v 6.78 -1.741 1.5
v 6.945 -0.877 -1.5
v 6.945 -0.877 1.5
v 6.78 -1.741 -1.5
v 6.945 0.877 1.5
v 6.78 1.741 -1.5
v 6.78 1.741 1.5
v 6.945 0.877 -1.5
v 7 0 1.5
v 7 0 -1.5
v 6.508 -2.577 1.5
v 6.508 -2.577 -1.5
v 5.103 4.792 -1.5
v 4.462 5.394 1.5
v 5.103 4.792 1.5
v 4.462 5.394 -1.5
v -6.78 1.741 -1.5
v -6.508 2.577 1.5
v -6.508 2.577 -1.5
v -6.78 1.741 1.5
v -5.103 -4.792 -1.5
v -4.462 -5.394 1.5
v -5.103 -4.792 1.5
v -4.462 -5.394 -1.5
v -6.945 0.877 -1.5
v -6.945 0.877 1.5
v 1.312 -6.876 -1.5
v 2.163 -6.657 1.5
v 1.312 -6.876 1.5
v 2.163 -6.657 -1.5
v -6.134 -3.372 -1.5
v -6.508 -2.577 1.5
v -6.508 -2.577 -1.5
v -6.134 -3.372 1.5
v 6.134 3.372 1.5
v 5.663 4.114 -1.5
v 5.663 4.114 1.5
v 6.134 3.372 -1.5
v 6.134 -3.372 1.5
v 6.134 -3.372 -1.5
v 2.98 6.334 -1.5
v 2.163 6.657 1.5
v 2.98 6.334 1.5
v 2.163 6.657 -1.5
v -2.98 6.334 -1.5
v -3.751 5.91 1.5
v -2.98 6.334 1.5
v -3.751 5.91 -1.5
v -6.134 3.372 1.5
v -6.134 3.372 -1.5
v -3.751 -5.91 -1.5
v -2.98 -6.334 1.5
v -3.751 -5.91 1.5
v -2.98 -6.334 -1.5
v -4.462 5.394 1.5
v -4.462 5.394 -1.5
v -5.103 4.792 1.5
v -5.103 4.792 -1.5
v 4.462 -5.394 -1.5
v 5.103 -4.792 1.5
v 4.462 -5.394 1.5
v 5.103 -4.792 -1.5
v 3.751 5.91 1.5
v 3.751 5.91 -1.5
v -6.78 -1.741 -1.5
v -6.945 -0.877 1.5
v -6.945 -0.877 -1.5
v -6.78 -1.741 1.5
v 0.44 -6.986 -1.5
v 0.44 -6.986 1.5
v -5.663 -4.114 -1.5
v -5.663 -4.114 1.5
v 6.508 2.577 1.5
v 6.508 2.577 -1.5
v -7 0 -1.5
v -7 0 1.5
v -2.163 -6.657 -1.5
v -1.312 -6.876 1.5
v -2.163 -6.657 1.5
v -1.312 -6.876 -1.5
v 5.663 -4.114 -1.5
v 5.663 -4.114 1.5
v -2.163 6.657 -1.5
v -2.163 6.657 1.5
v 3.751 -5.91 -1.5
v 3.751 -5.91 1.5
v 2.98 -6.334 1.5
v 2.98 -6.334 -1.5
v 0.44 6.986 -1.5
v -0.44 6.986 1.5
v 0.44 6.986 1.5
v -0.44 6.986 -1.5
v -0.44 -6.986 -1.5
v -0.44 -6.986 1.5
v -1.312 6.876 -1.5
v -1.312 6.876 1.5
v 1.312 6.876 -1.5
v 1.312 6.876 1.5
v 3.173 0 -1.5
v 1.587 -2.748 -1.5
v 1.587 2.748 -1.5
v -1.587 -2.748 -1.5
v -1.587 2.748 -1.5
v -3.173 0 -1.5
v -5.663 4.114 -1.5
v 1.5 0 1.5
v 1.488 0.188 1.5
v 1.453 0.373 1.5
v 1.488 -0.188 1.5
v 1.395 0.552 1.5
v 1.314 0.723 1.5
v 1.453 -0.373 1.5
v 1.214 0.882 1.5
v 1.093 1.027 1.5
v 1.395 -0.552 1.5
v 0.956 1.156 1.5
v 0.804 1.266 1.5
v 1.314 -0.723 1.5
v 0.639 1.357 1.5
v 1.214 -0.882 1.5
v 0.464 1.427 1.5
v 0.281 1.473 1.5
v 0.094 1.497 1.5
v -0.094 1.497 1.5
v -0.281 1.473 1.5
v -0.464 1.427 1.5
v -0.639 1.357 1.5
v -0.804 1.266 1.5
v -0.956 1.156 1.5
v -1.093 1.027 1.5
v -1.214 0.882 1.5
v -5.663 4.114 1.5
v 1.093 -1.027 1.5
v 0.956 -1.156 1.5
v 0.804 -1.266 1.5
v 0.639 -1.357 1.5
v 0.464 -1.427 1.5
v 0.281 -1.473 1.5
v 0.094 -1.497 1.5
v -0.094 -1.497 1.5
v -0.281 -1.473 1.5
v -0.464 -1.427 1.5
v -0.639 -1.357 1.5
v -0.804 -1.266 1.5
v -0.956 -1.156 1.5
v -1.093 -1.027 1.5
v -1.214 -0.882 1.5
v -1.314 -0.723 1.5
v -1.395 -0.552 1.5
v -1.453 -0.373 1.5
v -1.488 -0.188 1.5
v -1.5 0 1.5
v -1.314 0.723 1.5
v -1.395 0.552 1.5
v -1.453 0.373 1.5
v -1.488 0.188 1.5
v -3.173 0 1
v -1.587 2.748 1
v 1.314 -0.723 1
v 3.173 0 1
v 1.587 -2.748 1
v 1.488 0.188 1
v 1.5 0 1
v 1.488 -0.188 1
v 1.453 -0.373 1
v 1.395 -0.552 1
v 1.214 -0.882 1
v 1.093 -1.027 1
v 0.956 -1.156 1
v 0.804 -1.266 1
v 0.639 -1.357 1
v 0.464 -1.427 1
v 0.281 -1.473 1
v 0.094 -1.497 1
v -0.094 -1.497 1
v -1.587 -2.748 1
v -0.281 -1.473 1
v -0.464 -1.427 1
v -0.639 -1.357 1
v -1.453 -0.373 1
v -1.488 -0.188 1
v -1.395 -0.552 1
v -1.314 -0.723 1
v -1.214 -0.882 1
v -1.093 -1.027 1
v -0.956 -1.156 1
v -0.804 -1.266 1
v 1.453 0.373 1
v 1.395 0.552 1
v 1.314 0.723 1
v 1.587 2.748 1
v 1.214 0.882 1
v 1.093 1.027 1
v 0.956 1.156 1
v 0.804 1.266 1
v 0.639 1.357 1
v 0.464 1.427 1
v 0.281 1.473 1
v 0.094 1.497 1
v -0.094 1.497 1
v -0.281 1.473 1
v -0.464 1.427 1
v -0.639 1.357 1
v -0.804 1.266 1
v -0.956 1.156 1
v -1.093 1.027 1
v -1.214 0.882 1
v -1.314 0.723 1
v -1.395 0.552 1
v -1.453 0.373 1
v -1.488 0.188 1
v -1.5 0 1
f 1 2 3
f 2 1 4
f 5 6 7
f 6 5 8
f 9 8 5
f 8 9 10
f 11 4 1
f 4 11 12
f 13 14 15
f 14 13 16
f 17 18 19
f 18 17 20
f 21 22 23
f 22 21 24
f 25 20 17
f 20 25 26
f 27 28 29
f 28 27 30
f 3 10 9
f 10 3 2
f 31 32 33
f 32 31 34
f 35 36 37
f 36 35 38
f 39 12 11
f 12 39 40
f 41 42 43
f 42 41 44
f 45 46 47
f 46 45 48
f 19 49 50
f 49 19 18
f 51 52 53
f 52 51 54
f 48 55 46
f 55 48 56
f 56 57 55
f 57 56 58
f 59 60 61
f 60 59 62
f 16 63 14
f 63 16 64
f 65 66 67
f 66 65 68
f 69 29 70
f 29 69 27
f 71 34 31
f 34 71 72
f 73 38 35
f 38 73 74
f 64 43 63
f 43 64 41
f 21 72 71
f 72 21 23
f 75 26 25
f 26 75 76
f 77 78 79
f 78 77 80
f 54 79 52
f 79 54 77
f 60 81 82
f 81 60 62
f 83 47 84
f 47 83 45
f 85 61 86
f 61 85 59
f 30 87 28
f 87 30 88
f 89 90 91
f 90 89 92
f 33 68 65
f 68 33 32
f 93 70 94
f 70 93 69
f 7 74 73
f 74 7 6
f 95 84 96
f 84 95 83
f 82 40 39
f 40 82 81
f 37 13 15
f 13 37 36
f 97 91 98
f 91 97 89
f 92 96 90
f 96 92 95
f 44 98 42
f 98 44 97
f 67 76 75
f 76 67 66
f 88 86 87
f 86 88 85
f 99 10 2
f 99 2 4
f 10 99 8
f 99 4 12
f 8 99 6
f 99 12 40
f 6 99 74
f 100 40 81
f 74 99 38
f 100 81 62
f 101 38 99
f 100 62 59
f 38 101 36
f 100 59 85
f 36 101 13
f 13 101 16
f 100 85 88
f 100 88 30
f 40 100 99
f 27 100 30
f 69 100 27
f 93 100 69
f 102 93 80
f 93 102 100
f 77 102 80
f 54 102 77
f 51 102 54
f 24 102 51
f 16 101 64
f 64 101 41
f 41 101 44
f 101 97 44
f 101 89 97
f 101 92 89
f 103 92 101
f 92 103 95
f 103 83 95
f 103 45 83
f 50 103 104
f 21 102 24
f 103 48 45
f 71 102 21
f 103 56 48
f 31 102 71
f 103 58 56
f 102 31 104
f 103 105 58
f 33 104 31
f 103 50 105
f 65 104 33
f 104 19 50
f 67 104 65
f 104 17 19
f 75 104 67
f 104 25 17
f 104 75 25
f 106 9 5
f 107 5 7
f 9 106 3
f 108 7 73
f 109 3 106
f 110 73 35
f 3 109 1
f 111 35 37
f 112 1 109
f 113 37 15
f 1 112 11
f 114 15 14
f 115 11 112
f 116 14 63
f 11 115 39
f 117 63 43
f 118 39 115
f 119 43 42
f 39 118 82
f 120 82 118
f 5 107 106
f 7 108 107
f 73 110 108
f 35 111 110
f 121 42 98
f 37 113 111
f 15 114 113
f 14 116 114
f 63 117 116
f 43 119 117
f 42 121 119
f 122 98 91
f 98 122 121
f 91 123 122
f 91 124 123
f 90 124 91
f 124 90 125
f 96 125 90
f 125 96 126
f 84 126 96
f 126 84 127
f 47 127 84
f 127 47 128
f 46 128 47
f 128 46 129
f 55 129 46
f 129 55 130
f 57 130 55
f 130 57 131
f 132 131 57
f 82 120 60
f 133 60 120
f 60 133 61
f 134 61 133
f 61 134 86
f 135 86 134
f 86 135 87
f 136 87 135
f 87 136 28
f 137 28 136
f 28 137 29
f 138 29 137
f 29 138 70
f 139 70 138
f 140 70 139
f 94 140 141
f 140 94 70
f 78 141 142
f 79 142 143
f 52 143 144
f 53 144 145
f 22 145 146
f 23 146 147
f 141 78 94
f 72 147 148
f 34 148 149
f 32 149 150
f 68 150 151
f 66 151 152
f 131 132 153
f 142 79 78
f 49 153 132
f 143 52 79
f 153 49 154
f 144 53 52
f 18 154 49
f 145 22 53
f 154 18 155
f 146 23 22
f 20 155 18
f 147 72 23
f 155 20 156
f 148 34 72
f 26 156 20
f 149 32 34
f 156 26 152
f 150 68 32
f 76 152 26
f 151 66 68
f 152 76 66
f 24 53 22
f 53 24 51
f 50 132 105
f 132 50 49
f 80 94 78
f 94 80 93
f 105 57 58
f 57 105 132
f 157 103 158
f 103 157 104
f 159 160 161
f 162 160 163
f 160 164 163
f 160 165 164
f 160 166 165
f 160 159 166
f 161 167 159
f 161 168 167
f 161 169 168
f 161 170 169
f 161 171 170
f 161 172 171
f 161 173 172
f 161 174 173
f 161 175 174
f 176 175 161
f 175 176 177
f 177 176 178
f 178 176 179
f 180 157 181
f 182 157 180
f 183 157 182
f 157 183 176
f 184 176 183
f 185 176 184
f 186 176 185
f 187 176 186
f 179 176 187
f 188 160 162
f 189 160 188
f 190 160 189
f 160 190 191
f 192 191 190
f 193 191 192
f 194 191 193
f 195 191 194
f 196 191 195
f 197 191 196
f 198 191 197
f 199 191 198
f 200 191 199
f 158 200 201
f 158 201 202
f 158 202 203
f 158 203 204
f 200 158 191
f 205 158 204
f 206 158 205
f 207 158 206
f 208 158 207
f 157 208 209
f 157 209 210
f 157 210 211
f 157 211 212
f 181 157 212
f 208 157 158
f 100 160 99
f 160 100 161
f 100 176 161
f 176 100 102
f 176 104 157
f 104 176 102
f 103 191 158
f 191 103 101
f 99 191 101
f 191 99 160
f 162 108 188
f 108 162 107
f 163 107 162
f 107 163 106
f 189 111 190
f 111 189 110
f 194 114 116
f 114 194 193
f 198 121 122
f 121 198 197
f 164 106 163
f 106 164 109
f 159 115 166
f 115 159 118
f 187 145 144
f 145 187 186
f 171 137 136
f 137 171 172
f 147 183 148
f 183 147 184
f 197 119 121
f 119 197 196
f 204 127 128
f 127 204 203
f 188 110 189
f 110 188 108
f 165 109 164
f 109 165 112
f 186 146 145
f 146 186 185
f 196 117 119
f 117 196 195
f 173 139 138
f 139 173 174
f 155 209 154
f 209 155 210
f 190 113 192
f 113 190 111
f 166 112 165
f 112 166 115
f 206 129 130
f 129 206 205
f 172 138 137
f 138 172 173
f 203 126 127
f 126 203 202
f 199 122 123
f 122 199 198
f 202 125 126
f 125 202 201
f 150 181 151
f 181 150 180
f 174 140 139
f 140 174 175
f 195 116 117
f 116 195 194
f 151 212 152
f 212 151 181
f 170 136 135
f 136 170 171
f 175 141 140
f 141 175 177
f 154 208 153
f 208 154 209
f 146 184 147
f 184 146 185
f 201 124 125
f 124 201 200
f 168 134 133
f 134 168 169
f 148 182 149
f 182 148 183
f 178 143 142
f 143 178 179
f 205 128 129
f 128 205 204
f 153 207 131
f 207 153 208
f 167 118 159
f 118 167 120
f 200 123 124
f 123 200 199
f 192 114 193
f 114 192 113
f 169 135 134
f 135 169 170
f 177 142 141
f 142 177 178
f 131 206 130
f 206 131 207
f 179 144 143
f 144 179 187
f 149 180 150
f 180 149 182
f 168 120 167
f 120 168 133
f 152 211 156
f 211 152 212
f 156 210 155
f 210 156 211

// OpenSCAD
$fn = 50;


difference() {
	union() {
		translate(v = [0, 0, -1.5000000000]) {
			cylinder(h = 3, r = 7.0000000000);
		}
		translate(v = [0, 0, -1.5000000000]) {
			cylinder(h = 3, r = 3.0000000000);
		}
	}
	union() {
		translate(v = [0, 0, -1.5000000000]) {
			rotate(a = [0, 0, 0]) {
				difference() {
					union() {
						linear_extrude(height = 2.5000000000) {
							polygon(points = [[3.1735000000, 0.0000000000], [1.5867500000, 2.7483316189], [-1.5867500000, 2.7483316189], [-3.1735000000, 0.0000000000], [-1.5867500000, -2.7483316189], [1.5867500000, -2.7483316189]]);
						}
					}
					union();
				}
			}
		}
		translate(v = [0, 0, -100.0000000000]) {
			cylinder(h = 200, r = 1.5000000000);
		}
	}
}
